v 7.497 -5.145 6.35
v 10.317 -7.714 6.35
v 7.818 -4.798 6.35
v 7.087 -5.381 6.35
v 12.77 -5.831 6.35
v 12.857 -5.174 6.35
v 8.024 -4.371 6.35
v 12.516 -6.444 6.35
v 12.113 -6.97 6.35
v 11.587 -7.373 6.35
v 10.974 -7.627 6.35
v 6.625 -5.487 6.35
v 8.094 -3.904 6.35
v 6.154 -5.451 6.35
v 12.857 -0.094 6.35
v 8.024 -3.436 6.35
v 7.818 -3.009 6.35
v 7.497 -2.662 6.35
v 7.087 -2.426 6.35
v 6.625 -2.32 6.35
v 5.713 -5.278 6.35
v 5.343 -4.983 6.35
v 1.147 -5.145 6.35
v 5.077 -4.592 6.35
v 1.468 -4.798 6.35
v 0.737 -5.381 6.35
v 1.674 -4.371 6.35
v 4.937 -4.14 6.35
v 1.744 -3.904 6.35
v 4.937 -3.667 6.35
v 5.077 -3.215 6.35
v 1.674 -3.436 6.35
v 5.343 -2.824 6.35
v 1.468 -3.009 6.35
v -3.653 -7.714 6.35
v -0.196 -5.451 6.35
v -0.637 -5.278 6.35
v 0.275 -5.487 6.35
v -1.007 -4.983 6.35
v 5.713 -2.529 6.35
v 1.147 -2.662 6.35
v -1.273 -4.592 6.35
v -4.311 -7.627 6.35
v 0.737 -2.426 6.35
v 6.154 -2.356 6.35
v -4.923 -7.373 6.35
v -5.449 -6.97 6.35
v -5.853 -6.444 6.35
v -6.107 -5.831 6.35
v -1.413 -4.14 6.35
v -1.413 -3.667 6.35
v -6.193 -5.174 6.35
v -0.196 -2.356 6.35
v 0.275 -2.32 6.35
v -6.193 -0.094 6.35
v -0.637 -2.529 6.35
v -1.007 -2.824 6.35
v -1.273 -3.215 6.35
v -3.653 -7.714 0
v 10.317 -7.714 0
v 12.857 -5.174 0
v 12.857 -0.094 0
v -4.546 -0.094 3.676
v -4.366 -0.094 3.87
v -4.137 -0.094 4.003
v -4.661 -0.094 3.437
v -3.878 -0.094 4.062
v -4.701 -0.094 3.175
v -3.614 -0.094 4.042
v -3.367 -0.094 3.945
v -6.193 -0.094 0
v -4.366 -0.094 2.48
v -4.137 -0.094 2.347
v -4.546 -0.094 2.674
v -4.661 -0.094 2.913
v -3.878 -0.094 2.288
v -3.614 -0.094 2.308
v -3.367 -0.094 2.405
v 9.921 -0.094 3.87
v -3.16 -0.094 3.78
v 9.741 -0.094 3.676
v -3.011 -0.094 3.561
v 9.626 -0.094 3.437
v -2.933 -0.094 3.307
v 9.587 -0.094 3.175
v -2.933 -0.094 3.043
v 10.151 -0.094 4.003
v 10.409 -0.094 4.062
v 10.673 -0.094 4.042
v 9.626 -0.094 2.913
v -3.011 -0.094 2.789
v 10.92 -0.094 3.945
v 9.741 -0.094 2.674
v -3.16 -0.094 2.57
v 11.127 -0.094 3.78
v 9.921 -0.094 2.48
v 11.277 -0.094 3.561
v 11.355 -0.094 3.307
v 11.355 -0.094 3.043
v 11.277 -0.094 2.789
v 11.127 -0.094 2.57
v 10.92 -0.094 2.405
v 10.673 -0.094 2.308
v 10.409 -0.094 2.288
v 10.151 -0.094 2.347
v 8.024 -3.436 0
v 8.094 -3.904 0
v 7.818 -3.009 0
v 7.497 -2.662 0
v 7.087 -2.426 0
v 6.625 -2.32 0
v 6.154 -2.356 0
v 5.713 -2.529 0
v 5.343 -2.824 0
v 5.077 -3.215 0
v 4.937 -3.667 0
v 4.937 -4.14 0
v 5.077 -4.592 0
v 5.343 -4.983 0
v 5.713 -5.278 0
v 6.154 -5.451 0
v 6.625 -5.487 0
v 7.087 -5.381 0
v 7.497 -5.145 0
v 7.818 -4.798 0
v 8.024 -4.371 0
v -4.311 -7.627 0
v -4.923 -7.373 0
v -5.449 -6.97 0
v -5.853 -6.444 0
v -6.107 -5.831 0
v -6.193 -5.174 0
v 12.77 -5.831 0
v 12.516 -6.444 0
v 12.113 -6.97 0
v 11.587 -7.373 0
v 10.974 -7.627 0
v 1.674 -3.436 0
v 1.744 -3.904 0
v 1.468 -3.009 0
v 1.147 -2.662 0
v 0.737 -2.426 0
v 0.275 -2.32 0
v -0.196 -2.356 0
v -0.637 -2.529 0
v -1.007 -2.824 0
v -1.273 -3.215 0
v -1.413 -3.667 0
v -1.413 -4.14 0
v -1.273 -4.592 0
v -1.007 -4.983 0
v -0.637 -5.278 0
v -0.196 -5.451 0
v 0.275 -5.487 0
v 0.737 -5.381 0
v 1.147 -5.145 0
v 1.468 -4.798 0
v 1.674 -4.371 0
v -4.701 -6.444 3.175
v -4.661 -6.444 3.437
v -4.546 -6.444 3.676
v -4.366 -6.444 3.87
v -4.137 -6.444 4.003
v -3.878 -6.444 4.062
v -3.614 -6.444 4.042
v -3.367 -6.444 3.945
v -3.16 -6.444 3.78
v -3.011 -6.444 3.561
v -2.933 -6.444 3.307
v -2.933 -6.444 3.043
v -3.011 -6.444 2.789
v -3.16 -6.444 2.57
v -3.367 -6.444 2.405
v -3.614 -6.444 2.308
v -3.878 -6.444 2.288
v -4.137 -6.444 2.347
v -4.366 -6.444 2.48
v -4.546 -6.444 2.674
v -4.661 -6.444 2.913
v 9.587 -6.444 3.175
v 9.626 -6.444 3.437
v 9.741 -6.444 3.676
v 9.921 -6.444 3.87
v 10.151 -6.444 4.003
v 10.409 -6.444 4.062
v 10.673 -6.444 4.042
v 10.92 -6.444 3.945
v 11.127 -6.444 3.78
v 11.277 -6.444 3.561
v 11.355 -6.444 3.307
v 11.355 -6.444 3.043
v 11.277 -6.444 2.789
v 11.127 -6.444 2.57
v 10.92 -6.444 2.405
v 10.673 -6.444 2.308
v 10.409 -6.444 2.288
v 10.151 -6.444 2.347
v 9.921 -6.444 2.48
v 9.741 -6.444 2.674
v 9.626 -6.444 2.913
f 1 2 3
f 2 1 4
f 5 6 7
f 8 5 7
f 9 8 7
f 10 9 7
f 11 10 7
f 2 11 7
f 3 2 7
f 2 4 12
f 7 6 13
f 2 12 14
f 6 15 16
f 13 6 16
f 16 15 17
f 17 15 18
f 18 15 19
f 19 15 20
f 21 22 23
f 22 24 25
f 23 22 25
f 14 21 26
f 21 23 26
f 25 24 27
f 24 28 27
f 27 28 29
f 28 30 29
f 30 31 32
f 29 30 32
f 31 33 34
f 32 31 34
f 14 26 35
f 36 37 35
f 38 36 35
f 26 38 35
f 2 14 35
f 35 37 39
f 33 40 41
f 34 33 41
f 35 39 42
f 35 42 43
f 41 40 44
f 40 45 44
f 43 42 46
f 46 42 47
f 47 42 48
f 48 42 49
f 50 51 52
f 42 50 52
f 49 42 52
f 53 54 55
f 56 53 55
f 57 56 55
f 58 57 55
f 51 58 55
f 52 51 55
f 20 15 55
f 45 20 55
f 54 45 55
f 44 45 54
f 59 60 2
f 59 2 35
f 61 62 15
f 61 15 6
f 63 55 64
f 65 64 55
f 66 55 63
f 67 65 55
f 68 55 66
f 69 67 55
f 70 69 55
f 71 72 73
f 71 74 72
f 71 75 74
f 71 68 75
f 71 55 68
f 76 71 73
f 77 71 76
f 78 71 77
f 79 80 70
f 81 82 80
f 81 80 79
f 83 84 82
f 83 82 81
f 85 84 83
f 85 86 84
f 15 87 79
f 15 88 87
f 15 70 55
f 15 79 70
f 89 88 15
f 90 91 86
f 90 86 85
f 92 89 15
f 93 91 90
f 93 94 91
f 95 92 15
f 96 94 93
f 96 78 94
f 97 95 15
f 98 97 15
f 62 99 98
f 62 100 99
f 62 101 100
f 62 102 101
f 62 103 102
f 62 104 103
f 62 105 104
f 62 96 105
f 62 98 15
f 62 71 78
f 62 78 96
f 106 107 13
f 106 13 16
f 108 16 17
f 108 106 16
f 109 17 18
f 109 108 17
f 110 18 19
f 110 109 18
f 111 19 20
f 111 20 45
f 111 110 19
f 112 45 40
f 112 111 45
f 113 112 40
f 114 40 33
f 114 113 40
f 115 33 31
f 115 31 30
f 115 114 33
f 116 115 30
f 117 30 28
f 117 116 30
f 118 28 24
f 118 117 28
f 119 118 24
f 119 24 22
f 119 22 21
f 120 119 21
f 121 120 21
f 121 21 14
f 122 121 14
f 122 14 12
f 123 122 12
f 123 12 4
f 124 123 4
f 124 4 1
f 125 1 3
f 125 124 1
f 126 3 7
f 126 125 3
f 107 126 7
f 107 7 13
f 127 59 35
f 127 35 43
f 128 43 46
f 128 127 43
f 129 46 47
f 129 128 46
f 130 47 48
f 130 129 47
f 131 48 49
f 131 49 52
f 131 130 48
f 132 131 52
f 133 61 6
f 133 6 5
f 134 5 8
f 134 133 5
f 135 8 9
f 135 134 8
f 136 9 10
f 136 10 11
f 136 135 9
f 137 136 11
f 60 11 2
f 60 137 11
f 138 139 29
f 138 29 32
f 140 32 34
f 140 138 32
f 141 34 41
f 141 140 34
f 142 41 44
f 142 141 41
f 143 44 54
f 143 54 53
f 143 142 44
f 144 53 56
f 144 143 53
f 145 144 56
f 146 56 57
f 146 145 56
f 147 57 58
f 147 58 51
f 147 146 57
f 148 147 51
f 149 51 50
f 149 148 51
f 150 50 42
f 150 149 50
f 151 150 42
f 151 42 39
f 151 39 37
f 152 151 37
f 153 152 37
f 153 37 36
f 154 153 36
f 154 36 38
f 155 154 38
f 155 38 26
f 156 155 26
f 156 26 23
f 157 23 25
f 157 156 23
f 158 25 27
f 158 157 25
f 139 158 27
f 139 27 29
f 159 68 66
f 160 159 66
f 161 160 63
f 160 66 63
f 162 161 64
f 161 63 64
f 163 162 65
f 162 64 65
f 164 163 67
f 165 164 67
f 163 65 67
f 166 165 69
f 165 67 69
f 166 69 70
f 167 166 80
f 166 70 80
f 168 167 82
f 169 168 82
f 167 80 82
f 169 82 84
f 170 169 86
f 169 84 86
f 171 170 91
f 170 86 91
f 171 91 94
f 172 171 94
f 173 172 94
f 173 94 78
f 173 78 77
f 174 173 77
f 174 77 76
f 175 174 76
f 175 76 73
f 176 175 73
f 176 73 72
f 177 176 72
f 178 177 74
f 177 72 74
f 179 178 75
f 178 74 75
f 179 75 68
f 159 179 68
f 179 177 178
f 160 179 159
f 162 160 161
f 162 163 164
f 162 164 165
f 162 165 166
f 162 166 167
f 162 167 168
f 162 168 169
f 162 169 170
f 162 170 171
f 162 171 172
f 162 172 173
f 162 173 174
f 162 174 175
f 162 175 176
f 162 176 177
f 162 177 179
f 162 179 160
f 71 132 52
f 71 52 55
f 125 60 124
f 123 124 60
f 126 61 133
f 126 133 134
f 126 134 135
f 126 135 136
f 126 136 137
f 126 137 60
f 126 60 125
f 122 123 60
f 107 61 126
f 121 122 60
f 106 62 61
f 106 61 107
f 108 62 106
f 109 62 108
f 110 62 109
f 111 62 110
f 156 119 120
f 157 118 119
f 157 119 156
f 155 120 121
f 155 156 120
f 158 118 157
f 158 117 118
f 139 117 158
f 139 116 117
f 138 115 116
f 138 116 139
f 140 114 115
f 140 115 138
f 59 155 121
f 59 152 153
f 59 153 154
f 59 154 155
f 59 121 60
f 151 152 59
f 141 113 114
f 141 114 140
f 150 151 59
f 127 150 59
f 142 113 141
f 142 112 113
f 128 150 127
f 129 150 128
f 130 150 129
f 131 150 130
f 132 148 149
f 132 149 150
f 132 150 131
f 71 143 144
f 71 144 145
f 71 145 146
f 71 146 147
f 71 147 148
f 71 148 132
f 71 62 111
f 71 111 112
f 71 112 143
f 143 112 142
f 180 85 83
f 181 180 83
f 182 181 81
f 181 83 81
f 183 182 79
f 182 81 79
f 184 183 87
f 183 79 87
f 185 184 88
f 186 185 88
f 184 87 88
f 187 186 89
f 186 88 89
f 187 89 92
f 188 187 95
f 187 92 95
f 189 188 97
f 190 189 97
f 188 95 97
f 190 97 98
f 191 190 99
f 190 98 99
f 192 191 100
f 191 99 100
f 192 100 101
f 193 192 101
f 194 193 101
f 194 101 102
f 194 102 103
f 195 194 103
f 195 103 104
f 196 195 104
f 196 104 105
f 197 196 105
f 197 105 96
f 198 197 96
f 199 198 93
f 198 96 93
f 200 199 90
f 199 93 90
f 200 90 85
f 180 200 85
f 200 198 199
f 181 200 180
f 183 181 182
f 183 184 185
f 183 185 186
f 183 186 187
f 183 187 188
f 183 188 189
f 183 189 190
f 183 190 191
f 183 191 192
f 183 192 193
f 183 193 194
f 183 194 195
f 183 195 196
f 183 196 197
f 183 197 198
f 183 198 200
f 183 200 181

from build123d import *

# Parameters (mm, degrees)
SKETCH1_R           = 1.5875
BOSS_EXTRUDE1_DEPTH = 6.35
SKETCH2_R           = 0.889
CUT_EXTRUDE1_DEPTH  = 6.35


with BuildPart() as part:
    # Sketch1 → Boss-Extrude1 (new body)
    with BuildSketch(Plane.XY):
        with BuildLine():
            Line((-6.193204917, -0.093500134), (12.856795083, -0.093500134))
            Line((12.856795083, -0.093500134), (12.856795083, -5.173500134))
            ThreePointArc((12.856795083, -5.173500134), (12.112846307, -6.969551358), (10.316795083, -7.713500134))
            Line((10.316795083, -7.713500134), (-3.653204917, -7.713500134))
            ThreePointArc((-3.653204917, -7.713500134), (-5.449256142, -6.969551358), (-6.193204917, -5.173500134))
            Line((-6.193204917, -5.173500134), (-6.193204917, -0.093500134))
        make_face()
        with Locations((0.156795083, -3.903500134)):
            Circle(SKETCH1_R, mode=Mode.SUBTRACT)
        with Locations((6.506795083, -3.903500134)):
            Circle(SKETCH1_R, mode=Mode.SUBTRACT)
    extrude(amount=BOSS_EXTRUDE1_DEPTH)

    # Sketch2 → Cut-Extrude1 (cut)
    with BuildSketch(Plane(origin=(0, -0.093500134, 0), x_dir=(1, 0, 0), z_dir=(0, 1, 0))):
        with Locations(Location((-3.811954917, -3.175, 0), (0, 0, 180))):
            Circle(SKETCH2_R)
        with Locations(Location((10.475545083, -3.175, 0), (0, 0, 180))):
            Circle(SKETCH2_R)
    extrude(amount=-CUT_EXTRUDE1_DEPTH, mode=Mode.SUBTRACT)


solid = part.part
